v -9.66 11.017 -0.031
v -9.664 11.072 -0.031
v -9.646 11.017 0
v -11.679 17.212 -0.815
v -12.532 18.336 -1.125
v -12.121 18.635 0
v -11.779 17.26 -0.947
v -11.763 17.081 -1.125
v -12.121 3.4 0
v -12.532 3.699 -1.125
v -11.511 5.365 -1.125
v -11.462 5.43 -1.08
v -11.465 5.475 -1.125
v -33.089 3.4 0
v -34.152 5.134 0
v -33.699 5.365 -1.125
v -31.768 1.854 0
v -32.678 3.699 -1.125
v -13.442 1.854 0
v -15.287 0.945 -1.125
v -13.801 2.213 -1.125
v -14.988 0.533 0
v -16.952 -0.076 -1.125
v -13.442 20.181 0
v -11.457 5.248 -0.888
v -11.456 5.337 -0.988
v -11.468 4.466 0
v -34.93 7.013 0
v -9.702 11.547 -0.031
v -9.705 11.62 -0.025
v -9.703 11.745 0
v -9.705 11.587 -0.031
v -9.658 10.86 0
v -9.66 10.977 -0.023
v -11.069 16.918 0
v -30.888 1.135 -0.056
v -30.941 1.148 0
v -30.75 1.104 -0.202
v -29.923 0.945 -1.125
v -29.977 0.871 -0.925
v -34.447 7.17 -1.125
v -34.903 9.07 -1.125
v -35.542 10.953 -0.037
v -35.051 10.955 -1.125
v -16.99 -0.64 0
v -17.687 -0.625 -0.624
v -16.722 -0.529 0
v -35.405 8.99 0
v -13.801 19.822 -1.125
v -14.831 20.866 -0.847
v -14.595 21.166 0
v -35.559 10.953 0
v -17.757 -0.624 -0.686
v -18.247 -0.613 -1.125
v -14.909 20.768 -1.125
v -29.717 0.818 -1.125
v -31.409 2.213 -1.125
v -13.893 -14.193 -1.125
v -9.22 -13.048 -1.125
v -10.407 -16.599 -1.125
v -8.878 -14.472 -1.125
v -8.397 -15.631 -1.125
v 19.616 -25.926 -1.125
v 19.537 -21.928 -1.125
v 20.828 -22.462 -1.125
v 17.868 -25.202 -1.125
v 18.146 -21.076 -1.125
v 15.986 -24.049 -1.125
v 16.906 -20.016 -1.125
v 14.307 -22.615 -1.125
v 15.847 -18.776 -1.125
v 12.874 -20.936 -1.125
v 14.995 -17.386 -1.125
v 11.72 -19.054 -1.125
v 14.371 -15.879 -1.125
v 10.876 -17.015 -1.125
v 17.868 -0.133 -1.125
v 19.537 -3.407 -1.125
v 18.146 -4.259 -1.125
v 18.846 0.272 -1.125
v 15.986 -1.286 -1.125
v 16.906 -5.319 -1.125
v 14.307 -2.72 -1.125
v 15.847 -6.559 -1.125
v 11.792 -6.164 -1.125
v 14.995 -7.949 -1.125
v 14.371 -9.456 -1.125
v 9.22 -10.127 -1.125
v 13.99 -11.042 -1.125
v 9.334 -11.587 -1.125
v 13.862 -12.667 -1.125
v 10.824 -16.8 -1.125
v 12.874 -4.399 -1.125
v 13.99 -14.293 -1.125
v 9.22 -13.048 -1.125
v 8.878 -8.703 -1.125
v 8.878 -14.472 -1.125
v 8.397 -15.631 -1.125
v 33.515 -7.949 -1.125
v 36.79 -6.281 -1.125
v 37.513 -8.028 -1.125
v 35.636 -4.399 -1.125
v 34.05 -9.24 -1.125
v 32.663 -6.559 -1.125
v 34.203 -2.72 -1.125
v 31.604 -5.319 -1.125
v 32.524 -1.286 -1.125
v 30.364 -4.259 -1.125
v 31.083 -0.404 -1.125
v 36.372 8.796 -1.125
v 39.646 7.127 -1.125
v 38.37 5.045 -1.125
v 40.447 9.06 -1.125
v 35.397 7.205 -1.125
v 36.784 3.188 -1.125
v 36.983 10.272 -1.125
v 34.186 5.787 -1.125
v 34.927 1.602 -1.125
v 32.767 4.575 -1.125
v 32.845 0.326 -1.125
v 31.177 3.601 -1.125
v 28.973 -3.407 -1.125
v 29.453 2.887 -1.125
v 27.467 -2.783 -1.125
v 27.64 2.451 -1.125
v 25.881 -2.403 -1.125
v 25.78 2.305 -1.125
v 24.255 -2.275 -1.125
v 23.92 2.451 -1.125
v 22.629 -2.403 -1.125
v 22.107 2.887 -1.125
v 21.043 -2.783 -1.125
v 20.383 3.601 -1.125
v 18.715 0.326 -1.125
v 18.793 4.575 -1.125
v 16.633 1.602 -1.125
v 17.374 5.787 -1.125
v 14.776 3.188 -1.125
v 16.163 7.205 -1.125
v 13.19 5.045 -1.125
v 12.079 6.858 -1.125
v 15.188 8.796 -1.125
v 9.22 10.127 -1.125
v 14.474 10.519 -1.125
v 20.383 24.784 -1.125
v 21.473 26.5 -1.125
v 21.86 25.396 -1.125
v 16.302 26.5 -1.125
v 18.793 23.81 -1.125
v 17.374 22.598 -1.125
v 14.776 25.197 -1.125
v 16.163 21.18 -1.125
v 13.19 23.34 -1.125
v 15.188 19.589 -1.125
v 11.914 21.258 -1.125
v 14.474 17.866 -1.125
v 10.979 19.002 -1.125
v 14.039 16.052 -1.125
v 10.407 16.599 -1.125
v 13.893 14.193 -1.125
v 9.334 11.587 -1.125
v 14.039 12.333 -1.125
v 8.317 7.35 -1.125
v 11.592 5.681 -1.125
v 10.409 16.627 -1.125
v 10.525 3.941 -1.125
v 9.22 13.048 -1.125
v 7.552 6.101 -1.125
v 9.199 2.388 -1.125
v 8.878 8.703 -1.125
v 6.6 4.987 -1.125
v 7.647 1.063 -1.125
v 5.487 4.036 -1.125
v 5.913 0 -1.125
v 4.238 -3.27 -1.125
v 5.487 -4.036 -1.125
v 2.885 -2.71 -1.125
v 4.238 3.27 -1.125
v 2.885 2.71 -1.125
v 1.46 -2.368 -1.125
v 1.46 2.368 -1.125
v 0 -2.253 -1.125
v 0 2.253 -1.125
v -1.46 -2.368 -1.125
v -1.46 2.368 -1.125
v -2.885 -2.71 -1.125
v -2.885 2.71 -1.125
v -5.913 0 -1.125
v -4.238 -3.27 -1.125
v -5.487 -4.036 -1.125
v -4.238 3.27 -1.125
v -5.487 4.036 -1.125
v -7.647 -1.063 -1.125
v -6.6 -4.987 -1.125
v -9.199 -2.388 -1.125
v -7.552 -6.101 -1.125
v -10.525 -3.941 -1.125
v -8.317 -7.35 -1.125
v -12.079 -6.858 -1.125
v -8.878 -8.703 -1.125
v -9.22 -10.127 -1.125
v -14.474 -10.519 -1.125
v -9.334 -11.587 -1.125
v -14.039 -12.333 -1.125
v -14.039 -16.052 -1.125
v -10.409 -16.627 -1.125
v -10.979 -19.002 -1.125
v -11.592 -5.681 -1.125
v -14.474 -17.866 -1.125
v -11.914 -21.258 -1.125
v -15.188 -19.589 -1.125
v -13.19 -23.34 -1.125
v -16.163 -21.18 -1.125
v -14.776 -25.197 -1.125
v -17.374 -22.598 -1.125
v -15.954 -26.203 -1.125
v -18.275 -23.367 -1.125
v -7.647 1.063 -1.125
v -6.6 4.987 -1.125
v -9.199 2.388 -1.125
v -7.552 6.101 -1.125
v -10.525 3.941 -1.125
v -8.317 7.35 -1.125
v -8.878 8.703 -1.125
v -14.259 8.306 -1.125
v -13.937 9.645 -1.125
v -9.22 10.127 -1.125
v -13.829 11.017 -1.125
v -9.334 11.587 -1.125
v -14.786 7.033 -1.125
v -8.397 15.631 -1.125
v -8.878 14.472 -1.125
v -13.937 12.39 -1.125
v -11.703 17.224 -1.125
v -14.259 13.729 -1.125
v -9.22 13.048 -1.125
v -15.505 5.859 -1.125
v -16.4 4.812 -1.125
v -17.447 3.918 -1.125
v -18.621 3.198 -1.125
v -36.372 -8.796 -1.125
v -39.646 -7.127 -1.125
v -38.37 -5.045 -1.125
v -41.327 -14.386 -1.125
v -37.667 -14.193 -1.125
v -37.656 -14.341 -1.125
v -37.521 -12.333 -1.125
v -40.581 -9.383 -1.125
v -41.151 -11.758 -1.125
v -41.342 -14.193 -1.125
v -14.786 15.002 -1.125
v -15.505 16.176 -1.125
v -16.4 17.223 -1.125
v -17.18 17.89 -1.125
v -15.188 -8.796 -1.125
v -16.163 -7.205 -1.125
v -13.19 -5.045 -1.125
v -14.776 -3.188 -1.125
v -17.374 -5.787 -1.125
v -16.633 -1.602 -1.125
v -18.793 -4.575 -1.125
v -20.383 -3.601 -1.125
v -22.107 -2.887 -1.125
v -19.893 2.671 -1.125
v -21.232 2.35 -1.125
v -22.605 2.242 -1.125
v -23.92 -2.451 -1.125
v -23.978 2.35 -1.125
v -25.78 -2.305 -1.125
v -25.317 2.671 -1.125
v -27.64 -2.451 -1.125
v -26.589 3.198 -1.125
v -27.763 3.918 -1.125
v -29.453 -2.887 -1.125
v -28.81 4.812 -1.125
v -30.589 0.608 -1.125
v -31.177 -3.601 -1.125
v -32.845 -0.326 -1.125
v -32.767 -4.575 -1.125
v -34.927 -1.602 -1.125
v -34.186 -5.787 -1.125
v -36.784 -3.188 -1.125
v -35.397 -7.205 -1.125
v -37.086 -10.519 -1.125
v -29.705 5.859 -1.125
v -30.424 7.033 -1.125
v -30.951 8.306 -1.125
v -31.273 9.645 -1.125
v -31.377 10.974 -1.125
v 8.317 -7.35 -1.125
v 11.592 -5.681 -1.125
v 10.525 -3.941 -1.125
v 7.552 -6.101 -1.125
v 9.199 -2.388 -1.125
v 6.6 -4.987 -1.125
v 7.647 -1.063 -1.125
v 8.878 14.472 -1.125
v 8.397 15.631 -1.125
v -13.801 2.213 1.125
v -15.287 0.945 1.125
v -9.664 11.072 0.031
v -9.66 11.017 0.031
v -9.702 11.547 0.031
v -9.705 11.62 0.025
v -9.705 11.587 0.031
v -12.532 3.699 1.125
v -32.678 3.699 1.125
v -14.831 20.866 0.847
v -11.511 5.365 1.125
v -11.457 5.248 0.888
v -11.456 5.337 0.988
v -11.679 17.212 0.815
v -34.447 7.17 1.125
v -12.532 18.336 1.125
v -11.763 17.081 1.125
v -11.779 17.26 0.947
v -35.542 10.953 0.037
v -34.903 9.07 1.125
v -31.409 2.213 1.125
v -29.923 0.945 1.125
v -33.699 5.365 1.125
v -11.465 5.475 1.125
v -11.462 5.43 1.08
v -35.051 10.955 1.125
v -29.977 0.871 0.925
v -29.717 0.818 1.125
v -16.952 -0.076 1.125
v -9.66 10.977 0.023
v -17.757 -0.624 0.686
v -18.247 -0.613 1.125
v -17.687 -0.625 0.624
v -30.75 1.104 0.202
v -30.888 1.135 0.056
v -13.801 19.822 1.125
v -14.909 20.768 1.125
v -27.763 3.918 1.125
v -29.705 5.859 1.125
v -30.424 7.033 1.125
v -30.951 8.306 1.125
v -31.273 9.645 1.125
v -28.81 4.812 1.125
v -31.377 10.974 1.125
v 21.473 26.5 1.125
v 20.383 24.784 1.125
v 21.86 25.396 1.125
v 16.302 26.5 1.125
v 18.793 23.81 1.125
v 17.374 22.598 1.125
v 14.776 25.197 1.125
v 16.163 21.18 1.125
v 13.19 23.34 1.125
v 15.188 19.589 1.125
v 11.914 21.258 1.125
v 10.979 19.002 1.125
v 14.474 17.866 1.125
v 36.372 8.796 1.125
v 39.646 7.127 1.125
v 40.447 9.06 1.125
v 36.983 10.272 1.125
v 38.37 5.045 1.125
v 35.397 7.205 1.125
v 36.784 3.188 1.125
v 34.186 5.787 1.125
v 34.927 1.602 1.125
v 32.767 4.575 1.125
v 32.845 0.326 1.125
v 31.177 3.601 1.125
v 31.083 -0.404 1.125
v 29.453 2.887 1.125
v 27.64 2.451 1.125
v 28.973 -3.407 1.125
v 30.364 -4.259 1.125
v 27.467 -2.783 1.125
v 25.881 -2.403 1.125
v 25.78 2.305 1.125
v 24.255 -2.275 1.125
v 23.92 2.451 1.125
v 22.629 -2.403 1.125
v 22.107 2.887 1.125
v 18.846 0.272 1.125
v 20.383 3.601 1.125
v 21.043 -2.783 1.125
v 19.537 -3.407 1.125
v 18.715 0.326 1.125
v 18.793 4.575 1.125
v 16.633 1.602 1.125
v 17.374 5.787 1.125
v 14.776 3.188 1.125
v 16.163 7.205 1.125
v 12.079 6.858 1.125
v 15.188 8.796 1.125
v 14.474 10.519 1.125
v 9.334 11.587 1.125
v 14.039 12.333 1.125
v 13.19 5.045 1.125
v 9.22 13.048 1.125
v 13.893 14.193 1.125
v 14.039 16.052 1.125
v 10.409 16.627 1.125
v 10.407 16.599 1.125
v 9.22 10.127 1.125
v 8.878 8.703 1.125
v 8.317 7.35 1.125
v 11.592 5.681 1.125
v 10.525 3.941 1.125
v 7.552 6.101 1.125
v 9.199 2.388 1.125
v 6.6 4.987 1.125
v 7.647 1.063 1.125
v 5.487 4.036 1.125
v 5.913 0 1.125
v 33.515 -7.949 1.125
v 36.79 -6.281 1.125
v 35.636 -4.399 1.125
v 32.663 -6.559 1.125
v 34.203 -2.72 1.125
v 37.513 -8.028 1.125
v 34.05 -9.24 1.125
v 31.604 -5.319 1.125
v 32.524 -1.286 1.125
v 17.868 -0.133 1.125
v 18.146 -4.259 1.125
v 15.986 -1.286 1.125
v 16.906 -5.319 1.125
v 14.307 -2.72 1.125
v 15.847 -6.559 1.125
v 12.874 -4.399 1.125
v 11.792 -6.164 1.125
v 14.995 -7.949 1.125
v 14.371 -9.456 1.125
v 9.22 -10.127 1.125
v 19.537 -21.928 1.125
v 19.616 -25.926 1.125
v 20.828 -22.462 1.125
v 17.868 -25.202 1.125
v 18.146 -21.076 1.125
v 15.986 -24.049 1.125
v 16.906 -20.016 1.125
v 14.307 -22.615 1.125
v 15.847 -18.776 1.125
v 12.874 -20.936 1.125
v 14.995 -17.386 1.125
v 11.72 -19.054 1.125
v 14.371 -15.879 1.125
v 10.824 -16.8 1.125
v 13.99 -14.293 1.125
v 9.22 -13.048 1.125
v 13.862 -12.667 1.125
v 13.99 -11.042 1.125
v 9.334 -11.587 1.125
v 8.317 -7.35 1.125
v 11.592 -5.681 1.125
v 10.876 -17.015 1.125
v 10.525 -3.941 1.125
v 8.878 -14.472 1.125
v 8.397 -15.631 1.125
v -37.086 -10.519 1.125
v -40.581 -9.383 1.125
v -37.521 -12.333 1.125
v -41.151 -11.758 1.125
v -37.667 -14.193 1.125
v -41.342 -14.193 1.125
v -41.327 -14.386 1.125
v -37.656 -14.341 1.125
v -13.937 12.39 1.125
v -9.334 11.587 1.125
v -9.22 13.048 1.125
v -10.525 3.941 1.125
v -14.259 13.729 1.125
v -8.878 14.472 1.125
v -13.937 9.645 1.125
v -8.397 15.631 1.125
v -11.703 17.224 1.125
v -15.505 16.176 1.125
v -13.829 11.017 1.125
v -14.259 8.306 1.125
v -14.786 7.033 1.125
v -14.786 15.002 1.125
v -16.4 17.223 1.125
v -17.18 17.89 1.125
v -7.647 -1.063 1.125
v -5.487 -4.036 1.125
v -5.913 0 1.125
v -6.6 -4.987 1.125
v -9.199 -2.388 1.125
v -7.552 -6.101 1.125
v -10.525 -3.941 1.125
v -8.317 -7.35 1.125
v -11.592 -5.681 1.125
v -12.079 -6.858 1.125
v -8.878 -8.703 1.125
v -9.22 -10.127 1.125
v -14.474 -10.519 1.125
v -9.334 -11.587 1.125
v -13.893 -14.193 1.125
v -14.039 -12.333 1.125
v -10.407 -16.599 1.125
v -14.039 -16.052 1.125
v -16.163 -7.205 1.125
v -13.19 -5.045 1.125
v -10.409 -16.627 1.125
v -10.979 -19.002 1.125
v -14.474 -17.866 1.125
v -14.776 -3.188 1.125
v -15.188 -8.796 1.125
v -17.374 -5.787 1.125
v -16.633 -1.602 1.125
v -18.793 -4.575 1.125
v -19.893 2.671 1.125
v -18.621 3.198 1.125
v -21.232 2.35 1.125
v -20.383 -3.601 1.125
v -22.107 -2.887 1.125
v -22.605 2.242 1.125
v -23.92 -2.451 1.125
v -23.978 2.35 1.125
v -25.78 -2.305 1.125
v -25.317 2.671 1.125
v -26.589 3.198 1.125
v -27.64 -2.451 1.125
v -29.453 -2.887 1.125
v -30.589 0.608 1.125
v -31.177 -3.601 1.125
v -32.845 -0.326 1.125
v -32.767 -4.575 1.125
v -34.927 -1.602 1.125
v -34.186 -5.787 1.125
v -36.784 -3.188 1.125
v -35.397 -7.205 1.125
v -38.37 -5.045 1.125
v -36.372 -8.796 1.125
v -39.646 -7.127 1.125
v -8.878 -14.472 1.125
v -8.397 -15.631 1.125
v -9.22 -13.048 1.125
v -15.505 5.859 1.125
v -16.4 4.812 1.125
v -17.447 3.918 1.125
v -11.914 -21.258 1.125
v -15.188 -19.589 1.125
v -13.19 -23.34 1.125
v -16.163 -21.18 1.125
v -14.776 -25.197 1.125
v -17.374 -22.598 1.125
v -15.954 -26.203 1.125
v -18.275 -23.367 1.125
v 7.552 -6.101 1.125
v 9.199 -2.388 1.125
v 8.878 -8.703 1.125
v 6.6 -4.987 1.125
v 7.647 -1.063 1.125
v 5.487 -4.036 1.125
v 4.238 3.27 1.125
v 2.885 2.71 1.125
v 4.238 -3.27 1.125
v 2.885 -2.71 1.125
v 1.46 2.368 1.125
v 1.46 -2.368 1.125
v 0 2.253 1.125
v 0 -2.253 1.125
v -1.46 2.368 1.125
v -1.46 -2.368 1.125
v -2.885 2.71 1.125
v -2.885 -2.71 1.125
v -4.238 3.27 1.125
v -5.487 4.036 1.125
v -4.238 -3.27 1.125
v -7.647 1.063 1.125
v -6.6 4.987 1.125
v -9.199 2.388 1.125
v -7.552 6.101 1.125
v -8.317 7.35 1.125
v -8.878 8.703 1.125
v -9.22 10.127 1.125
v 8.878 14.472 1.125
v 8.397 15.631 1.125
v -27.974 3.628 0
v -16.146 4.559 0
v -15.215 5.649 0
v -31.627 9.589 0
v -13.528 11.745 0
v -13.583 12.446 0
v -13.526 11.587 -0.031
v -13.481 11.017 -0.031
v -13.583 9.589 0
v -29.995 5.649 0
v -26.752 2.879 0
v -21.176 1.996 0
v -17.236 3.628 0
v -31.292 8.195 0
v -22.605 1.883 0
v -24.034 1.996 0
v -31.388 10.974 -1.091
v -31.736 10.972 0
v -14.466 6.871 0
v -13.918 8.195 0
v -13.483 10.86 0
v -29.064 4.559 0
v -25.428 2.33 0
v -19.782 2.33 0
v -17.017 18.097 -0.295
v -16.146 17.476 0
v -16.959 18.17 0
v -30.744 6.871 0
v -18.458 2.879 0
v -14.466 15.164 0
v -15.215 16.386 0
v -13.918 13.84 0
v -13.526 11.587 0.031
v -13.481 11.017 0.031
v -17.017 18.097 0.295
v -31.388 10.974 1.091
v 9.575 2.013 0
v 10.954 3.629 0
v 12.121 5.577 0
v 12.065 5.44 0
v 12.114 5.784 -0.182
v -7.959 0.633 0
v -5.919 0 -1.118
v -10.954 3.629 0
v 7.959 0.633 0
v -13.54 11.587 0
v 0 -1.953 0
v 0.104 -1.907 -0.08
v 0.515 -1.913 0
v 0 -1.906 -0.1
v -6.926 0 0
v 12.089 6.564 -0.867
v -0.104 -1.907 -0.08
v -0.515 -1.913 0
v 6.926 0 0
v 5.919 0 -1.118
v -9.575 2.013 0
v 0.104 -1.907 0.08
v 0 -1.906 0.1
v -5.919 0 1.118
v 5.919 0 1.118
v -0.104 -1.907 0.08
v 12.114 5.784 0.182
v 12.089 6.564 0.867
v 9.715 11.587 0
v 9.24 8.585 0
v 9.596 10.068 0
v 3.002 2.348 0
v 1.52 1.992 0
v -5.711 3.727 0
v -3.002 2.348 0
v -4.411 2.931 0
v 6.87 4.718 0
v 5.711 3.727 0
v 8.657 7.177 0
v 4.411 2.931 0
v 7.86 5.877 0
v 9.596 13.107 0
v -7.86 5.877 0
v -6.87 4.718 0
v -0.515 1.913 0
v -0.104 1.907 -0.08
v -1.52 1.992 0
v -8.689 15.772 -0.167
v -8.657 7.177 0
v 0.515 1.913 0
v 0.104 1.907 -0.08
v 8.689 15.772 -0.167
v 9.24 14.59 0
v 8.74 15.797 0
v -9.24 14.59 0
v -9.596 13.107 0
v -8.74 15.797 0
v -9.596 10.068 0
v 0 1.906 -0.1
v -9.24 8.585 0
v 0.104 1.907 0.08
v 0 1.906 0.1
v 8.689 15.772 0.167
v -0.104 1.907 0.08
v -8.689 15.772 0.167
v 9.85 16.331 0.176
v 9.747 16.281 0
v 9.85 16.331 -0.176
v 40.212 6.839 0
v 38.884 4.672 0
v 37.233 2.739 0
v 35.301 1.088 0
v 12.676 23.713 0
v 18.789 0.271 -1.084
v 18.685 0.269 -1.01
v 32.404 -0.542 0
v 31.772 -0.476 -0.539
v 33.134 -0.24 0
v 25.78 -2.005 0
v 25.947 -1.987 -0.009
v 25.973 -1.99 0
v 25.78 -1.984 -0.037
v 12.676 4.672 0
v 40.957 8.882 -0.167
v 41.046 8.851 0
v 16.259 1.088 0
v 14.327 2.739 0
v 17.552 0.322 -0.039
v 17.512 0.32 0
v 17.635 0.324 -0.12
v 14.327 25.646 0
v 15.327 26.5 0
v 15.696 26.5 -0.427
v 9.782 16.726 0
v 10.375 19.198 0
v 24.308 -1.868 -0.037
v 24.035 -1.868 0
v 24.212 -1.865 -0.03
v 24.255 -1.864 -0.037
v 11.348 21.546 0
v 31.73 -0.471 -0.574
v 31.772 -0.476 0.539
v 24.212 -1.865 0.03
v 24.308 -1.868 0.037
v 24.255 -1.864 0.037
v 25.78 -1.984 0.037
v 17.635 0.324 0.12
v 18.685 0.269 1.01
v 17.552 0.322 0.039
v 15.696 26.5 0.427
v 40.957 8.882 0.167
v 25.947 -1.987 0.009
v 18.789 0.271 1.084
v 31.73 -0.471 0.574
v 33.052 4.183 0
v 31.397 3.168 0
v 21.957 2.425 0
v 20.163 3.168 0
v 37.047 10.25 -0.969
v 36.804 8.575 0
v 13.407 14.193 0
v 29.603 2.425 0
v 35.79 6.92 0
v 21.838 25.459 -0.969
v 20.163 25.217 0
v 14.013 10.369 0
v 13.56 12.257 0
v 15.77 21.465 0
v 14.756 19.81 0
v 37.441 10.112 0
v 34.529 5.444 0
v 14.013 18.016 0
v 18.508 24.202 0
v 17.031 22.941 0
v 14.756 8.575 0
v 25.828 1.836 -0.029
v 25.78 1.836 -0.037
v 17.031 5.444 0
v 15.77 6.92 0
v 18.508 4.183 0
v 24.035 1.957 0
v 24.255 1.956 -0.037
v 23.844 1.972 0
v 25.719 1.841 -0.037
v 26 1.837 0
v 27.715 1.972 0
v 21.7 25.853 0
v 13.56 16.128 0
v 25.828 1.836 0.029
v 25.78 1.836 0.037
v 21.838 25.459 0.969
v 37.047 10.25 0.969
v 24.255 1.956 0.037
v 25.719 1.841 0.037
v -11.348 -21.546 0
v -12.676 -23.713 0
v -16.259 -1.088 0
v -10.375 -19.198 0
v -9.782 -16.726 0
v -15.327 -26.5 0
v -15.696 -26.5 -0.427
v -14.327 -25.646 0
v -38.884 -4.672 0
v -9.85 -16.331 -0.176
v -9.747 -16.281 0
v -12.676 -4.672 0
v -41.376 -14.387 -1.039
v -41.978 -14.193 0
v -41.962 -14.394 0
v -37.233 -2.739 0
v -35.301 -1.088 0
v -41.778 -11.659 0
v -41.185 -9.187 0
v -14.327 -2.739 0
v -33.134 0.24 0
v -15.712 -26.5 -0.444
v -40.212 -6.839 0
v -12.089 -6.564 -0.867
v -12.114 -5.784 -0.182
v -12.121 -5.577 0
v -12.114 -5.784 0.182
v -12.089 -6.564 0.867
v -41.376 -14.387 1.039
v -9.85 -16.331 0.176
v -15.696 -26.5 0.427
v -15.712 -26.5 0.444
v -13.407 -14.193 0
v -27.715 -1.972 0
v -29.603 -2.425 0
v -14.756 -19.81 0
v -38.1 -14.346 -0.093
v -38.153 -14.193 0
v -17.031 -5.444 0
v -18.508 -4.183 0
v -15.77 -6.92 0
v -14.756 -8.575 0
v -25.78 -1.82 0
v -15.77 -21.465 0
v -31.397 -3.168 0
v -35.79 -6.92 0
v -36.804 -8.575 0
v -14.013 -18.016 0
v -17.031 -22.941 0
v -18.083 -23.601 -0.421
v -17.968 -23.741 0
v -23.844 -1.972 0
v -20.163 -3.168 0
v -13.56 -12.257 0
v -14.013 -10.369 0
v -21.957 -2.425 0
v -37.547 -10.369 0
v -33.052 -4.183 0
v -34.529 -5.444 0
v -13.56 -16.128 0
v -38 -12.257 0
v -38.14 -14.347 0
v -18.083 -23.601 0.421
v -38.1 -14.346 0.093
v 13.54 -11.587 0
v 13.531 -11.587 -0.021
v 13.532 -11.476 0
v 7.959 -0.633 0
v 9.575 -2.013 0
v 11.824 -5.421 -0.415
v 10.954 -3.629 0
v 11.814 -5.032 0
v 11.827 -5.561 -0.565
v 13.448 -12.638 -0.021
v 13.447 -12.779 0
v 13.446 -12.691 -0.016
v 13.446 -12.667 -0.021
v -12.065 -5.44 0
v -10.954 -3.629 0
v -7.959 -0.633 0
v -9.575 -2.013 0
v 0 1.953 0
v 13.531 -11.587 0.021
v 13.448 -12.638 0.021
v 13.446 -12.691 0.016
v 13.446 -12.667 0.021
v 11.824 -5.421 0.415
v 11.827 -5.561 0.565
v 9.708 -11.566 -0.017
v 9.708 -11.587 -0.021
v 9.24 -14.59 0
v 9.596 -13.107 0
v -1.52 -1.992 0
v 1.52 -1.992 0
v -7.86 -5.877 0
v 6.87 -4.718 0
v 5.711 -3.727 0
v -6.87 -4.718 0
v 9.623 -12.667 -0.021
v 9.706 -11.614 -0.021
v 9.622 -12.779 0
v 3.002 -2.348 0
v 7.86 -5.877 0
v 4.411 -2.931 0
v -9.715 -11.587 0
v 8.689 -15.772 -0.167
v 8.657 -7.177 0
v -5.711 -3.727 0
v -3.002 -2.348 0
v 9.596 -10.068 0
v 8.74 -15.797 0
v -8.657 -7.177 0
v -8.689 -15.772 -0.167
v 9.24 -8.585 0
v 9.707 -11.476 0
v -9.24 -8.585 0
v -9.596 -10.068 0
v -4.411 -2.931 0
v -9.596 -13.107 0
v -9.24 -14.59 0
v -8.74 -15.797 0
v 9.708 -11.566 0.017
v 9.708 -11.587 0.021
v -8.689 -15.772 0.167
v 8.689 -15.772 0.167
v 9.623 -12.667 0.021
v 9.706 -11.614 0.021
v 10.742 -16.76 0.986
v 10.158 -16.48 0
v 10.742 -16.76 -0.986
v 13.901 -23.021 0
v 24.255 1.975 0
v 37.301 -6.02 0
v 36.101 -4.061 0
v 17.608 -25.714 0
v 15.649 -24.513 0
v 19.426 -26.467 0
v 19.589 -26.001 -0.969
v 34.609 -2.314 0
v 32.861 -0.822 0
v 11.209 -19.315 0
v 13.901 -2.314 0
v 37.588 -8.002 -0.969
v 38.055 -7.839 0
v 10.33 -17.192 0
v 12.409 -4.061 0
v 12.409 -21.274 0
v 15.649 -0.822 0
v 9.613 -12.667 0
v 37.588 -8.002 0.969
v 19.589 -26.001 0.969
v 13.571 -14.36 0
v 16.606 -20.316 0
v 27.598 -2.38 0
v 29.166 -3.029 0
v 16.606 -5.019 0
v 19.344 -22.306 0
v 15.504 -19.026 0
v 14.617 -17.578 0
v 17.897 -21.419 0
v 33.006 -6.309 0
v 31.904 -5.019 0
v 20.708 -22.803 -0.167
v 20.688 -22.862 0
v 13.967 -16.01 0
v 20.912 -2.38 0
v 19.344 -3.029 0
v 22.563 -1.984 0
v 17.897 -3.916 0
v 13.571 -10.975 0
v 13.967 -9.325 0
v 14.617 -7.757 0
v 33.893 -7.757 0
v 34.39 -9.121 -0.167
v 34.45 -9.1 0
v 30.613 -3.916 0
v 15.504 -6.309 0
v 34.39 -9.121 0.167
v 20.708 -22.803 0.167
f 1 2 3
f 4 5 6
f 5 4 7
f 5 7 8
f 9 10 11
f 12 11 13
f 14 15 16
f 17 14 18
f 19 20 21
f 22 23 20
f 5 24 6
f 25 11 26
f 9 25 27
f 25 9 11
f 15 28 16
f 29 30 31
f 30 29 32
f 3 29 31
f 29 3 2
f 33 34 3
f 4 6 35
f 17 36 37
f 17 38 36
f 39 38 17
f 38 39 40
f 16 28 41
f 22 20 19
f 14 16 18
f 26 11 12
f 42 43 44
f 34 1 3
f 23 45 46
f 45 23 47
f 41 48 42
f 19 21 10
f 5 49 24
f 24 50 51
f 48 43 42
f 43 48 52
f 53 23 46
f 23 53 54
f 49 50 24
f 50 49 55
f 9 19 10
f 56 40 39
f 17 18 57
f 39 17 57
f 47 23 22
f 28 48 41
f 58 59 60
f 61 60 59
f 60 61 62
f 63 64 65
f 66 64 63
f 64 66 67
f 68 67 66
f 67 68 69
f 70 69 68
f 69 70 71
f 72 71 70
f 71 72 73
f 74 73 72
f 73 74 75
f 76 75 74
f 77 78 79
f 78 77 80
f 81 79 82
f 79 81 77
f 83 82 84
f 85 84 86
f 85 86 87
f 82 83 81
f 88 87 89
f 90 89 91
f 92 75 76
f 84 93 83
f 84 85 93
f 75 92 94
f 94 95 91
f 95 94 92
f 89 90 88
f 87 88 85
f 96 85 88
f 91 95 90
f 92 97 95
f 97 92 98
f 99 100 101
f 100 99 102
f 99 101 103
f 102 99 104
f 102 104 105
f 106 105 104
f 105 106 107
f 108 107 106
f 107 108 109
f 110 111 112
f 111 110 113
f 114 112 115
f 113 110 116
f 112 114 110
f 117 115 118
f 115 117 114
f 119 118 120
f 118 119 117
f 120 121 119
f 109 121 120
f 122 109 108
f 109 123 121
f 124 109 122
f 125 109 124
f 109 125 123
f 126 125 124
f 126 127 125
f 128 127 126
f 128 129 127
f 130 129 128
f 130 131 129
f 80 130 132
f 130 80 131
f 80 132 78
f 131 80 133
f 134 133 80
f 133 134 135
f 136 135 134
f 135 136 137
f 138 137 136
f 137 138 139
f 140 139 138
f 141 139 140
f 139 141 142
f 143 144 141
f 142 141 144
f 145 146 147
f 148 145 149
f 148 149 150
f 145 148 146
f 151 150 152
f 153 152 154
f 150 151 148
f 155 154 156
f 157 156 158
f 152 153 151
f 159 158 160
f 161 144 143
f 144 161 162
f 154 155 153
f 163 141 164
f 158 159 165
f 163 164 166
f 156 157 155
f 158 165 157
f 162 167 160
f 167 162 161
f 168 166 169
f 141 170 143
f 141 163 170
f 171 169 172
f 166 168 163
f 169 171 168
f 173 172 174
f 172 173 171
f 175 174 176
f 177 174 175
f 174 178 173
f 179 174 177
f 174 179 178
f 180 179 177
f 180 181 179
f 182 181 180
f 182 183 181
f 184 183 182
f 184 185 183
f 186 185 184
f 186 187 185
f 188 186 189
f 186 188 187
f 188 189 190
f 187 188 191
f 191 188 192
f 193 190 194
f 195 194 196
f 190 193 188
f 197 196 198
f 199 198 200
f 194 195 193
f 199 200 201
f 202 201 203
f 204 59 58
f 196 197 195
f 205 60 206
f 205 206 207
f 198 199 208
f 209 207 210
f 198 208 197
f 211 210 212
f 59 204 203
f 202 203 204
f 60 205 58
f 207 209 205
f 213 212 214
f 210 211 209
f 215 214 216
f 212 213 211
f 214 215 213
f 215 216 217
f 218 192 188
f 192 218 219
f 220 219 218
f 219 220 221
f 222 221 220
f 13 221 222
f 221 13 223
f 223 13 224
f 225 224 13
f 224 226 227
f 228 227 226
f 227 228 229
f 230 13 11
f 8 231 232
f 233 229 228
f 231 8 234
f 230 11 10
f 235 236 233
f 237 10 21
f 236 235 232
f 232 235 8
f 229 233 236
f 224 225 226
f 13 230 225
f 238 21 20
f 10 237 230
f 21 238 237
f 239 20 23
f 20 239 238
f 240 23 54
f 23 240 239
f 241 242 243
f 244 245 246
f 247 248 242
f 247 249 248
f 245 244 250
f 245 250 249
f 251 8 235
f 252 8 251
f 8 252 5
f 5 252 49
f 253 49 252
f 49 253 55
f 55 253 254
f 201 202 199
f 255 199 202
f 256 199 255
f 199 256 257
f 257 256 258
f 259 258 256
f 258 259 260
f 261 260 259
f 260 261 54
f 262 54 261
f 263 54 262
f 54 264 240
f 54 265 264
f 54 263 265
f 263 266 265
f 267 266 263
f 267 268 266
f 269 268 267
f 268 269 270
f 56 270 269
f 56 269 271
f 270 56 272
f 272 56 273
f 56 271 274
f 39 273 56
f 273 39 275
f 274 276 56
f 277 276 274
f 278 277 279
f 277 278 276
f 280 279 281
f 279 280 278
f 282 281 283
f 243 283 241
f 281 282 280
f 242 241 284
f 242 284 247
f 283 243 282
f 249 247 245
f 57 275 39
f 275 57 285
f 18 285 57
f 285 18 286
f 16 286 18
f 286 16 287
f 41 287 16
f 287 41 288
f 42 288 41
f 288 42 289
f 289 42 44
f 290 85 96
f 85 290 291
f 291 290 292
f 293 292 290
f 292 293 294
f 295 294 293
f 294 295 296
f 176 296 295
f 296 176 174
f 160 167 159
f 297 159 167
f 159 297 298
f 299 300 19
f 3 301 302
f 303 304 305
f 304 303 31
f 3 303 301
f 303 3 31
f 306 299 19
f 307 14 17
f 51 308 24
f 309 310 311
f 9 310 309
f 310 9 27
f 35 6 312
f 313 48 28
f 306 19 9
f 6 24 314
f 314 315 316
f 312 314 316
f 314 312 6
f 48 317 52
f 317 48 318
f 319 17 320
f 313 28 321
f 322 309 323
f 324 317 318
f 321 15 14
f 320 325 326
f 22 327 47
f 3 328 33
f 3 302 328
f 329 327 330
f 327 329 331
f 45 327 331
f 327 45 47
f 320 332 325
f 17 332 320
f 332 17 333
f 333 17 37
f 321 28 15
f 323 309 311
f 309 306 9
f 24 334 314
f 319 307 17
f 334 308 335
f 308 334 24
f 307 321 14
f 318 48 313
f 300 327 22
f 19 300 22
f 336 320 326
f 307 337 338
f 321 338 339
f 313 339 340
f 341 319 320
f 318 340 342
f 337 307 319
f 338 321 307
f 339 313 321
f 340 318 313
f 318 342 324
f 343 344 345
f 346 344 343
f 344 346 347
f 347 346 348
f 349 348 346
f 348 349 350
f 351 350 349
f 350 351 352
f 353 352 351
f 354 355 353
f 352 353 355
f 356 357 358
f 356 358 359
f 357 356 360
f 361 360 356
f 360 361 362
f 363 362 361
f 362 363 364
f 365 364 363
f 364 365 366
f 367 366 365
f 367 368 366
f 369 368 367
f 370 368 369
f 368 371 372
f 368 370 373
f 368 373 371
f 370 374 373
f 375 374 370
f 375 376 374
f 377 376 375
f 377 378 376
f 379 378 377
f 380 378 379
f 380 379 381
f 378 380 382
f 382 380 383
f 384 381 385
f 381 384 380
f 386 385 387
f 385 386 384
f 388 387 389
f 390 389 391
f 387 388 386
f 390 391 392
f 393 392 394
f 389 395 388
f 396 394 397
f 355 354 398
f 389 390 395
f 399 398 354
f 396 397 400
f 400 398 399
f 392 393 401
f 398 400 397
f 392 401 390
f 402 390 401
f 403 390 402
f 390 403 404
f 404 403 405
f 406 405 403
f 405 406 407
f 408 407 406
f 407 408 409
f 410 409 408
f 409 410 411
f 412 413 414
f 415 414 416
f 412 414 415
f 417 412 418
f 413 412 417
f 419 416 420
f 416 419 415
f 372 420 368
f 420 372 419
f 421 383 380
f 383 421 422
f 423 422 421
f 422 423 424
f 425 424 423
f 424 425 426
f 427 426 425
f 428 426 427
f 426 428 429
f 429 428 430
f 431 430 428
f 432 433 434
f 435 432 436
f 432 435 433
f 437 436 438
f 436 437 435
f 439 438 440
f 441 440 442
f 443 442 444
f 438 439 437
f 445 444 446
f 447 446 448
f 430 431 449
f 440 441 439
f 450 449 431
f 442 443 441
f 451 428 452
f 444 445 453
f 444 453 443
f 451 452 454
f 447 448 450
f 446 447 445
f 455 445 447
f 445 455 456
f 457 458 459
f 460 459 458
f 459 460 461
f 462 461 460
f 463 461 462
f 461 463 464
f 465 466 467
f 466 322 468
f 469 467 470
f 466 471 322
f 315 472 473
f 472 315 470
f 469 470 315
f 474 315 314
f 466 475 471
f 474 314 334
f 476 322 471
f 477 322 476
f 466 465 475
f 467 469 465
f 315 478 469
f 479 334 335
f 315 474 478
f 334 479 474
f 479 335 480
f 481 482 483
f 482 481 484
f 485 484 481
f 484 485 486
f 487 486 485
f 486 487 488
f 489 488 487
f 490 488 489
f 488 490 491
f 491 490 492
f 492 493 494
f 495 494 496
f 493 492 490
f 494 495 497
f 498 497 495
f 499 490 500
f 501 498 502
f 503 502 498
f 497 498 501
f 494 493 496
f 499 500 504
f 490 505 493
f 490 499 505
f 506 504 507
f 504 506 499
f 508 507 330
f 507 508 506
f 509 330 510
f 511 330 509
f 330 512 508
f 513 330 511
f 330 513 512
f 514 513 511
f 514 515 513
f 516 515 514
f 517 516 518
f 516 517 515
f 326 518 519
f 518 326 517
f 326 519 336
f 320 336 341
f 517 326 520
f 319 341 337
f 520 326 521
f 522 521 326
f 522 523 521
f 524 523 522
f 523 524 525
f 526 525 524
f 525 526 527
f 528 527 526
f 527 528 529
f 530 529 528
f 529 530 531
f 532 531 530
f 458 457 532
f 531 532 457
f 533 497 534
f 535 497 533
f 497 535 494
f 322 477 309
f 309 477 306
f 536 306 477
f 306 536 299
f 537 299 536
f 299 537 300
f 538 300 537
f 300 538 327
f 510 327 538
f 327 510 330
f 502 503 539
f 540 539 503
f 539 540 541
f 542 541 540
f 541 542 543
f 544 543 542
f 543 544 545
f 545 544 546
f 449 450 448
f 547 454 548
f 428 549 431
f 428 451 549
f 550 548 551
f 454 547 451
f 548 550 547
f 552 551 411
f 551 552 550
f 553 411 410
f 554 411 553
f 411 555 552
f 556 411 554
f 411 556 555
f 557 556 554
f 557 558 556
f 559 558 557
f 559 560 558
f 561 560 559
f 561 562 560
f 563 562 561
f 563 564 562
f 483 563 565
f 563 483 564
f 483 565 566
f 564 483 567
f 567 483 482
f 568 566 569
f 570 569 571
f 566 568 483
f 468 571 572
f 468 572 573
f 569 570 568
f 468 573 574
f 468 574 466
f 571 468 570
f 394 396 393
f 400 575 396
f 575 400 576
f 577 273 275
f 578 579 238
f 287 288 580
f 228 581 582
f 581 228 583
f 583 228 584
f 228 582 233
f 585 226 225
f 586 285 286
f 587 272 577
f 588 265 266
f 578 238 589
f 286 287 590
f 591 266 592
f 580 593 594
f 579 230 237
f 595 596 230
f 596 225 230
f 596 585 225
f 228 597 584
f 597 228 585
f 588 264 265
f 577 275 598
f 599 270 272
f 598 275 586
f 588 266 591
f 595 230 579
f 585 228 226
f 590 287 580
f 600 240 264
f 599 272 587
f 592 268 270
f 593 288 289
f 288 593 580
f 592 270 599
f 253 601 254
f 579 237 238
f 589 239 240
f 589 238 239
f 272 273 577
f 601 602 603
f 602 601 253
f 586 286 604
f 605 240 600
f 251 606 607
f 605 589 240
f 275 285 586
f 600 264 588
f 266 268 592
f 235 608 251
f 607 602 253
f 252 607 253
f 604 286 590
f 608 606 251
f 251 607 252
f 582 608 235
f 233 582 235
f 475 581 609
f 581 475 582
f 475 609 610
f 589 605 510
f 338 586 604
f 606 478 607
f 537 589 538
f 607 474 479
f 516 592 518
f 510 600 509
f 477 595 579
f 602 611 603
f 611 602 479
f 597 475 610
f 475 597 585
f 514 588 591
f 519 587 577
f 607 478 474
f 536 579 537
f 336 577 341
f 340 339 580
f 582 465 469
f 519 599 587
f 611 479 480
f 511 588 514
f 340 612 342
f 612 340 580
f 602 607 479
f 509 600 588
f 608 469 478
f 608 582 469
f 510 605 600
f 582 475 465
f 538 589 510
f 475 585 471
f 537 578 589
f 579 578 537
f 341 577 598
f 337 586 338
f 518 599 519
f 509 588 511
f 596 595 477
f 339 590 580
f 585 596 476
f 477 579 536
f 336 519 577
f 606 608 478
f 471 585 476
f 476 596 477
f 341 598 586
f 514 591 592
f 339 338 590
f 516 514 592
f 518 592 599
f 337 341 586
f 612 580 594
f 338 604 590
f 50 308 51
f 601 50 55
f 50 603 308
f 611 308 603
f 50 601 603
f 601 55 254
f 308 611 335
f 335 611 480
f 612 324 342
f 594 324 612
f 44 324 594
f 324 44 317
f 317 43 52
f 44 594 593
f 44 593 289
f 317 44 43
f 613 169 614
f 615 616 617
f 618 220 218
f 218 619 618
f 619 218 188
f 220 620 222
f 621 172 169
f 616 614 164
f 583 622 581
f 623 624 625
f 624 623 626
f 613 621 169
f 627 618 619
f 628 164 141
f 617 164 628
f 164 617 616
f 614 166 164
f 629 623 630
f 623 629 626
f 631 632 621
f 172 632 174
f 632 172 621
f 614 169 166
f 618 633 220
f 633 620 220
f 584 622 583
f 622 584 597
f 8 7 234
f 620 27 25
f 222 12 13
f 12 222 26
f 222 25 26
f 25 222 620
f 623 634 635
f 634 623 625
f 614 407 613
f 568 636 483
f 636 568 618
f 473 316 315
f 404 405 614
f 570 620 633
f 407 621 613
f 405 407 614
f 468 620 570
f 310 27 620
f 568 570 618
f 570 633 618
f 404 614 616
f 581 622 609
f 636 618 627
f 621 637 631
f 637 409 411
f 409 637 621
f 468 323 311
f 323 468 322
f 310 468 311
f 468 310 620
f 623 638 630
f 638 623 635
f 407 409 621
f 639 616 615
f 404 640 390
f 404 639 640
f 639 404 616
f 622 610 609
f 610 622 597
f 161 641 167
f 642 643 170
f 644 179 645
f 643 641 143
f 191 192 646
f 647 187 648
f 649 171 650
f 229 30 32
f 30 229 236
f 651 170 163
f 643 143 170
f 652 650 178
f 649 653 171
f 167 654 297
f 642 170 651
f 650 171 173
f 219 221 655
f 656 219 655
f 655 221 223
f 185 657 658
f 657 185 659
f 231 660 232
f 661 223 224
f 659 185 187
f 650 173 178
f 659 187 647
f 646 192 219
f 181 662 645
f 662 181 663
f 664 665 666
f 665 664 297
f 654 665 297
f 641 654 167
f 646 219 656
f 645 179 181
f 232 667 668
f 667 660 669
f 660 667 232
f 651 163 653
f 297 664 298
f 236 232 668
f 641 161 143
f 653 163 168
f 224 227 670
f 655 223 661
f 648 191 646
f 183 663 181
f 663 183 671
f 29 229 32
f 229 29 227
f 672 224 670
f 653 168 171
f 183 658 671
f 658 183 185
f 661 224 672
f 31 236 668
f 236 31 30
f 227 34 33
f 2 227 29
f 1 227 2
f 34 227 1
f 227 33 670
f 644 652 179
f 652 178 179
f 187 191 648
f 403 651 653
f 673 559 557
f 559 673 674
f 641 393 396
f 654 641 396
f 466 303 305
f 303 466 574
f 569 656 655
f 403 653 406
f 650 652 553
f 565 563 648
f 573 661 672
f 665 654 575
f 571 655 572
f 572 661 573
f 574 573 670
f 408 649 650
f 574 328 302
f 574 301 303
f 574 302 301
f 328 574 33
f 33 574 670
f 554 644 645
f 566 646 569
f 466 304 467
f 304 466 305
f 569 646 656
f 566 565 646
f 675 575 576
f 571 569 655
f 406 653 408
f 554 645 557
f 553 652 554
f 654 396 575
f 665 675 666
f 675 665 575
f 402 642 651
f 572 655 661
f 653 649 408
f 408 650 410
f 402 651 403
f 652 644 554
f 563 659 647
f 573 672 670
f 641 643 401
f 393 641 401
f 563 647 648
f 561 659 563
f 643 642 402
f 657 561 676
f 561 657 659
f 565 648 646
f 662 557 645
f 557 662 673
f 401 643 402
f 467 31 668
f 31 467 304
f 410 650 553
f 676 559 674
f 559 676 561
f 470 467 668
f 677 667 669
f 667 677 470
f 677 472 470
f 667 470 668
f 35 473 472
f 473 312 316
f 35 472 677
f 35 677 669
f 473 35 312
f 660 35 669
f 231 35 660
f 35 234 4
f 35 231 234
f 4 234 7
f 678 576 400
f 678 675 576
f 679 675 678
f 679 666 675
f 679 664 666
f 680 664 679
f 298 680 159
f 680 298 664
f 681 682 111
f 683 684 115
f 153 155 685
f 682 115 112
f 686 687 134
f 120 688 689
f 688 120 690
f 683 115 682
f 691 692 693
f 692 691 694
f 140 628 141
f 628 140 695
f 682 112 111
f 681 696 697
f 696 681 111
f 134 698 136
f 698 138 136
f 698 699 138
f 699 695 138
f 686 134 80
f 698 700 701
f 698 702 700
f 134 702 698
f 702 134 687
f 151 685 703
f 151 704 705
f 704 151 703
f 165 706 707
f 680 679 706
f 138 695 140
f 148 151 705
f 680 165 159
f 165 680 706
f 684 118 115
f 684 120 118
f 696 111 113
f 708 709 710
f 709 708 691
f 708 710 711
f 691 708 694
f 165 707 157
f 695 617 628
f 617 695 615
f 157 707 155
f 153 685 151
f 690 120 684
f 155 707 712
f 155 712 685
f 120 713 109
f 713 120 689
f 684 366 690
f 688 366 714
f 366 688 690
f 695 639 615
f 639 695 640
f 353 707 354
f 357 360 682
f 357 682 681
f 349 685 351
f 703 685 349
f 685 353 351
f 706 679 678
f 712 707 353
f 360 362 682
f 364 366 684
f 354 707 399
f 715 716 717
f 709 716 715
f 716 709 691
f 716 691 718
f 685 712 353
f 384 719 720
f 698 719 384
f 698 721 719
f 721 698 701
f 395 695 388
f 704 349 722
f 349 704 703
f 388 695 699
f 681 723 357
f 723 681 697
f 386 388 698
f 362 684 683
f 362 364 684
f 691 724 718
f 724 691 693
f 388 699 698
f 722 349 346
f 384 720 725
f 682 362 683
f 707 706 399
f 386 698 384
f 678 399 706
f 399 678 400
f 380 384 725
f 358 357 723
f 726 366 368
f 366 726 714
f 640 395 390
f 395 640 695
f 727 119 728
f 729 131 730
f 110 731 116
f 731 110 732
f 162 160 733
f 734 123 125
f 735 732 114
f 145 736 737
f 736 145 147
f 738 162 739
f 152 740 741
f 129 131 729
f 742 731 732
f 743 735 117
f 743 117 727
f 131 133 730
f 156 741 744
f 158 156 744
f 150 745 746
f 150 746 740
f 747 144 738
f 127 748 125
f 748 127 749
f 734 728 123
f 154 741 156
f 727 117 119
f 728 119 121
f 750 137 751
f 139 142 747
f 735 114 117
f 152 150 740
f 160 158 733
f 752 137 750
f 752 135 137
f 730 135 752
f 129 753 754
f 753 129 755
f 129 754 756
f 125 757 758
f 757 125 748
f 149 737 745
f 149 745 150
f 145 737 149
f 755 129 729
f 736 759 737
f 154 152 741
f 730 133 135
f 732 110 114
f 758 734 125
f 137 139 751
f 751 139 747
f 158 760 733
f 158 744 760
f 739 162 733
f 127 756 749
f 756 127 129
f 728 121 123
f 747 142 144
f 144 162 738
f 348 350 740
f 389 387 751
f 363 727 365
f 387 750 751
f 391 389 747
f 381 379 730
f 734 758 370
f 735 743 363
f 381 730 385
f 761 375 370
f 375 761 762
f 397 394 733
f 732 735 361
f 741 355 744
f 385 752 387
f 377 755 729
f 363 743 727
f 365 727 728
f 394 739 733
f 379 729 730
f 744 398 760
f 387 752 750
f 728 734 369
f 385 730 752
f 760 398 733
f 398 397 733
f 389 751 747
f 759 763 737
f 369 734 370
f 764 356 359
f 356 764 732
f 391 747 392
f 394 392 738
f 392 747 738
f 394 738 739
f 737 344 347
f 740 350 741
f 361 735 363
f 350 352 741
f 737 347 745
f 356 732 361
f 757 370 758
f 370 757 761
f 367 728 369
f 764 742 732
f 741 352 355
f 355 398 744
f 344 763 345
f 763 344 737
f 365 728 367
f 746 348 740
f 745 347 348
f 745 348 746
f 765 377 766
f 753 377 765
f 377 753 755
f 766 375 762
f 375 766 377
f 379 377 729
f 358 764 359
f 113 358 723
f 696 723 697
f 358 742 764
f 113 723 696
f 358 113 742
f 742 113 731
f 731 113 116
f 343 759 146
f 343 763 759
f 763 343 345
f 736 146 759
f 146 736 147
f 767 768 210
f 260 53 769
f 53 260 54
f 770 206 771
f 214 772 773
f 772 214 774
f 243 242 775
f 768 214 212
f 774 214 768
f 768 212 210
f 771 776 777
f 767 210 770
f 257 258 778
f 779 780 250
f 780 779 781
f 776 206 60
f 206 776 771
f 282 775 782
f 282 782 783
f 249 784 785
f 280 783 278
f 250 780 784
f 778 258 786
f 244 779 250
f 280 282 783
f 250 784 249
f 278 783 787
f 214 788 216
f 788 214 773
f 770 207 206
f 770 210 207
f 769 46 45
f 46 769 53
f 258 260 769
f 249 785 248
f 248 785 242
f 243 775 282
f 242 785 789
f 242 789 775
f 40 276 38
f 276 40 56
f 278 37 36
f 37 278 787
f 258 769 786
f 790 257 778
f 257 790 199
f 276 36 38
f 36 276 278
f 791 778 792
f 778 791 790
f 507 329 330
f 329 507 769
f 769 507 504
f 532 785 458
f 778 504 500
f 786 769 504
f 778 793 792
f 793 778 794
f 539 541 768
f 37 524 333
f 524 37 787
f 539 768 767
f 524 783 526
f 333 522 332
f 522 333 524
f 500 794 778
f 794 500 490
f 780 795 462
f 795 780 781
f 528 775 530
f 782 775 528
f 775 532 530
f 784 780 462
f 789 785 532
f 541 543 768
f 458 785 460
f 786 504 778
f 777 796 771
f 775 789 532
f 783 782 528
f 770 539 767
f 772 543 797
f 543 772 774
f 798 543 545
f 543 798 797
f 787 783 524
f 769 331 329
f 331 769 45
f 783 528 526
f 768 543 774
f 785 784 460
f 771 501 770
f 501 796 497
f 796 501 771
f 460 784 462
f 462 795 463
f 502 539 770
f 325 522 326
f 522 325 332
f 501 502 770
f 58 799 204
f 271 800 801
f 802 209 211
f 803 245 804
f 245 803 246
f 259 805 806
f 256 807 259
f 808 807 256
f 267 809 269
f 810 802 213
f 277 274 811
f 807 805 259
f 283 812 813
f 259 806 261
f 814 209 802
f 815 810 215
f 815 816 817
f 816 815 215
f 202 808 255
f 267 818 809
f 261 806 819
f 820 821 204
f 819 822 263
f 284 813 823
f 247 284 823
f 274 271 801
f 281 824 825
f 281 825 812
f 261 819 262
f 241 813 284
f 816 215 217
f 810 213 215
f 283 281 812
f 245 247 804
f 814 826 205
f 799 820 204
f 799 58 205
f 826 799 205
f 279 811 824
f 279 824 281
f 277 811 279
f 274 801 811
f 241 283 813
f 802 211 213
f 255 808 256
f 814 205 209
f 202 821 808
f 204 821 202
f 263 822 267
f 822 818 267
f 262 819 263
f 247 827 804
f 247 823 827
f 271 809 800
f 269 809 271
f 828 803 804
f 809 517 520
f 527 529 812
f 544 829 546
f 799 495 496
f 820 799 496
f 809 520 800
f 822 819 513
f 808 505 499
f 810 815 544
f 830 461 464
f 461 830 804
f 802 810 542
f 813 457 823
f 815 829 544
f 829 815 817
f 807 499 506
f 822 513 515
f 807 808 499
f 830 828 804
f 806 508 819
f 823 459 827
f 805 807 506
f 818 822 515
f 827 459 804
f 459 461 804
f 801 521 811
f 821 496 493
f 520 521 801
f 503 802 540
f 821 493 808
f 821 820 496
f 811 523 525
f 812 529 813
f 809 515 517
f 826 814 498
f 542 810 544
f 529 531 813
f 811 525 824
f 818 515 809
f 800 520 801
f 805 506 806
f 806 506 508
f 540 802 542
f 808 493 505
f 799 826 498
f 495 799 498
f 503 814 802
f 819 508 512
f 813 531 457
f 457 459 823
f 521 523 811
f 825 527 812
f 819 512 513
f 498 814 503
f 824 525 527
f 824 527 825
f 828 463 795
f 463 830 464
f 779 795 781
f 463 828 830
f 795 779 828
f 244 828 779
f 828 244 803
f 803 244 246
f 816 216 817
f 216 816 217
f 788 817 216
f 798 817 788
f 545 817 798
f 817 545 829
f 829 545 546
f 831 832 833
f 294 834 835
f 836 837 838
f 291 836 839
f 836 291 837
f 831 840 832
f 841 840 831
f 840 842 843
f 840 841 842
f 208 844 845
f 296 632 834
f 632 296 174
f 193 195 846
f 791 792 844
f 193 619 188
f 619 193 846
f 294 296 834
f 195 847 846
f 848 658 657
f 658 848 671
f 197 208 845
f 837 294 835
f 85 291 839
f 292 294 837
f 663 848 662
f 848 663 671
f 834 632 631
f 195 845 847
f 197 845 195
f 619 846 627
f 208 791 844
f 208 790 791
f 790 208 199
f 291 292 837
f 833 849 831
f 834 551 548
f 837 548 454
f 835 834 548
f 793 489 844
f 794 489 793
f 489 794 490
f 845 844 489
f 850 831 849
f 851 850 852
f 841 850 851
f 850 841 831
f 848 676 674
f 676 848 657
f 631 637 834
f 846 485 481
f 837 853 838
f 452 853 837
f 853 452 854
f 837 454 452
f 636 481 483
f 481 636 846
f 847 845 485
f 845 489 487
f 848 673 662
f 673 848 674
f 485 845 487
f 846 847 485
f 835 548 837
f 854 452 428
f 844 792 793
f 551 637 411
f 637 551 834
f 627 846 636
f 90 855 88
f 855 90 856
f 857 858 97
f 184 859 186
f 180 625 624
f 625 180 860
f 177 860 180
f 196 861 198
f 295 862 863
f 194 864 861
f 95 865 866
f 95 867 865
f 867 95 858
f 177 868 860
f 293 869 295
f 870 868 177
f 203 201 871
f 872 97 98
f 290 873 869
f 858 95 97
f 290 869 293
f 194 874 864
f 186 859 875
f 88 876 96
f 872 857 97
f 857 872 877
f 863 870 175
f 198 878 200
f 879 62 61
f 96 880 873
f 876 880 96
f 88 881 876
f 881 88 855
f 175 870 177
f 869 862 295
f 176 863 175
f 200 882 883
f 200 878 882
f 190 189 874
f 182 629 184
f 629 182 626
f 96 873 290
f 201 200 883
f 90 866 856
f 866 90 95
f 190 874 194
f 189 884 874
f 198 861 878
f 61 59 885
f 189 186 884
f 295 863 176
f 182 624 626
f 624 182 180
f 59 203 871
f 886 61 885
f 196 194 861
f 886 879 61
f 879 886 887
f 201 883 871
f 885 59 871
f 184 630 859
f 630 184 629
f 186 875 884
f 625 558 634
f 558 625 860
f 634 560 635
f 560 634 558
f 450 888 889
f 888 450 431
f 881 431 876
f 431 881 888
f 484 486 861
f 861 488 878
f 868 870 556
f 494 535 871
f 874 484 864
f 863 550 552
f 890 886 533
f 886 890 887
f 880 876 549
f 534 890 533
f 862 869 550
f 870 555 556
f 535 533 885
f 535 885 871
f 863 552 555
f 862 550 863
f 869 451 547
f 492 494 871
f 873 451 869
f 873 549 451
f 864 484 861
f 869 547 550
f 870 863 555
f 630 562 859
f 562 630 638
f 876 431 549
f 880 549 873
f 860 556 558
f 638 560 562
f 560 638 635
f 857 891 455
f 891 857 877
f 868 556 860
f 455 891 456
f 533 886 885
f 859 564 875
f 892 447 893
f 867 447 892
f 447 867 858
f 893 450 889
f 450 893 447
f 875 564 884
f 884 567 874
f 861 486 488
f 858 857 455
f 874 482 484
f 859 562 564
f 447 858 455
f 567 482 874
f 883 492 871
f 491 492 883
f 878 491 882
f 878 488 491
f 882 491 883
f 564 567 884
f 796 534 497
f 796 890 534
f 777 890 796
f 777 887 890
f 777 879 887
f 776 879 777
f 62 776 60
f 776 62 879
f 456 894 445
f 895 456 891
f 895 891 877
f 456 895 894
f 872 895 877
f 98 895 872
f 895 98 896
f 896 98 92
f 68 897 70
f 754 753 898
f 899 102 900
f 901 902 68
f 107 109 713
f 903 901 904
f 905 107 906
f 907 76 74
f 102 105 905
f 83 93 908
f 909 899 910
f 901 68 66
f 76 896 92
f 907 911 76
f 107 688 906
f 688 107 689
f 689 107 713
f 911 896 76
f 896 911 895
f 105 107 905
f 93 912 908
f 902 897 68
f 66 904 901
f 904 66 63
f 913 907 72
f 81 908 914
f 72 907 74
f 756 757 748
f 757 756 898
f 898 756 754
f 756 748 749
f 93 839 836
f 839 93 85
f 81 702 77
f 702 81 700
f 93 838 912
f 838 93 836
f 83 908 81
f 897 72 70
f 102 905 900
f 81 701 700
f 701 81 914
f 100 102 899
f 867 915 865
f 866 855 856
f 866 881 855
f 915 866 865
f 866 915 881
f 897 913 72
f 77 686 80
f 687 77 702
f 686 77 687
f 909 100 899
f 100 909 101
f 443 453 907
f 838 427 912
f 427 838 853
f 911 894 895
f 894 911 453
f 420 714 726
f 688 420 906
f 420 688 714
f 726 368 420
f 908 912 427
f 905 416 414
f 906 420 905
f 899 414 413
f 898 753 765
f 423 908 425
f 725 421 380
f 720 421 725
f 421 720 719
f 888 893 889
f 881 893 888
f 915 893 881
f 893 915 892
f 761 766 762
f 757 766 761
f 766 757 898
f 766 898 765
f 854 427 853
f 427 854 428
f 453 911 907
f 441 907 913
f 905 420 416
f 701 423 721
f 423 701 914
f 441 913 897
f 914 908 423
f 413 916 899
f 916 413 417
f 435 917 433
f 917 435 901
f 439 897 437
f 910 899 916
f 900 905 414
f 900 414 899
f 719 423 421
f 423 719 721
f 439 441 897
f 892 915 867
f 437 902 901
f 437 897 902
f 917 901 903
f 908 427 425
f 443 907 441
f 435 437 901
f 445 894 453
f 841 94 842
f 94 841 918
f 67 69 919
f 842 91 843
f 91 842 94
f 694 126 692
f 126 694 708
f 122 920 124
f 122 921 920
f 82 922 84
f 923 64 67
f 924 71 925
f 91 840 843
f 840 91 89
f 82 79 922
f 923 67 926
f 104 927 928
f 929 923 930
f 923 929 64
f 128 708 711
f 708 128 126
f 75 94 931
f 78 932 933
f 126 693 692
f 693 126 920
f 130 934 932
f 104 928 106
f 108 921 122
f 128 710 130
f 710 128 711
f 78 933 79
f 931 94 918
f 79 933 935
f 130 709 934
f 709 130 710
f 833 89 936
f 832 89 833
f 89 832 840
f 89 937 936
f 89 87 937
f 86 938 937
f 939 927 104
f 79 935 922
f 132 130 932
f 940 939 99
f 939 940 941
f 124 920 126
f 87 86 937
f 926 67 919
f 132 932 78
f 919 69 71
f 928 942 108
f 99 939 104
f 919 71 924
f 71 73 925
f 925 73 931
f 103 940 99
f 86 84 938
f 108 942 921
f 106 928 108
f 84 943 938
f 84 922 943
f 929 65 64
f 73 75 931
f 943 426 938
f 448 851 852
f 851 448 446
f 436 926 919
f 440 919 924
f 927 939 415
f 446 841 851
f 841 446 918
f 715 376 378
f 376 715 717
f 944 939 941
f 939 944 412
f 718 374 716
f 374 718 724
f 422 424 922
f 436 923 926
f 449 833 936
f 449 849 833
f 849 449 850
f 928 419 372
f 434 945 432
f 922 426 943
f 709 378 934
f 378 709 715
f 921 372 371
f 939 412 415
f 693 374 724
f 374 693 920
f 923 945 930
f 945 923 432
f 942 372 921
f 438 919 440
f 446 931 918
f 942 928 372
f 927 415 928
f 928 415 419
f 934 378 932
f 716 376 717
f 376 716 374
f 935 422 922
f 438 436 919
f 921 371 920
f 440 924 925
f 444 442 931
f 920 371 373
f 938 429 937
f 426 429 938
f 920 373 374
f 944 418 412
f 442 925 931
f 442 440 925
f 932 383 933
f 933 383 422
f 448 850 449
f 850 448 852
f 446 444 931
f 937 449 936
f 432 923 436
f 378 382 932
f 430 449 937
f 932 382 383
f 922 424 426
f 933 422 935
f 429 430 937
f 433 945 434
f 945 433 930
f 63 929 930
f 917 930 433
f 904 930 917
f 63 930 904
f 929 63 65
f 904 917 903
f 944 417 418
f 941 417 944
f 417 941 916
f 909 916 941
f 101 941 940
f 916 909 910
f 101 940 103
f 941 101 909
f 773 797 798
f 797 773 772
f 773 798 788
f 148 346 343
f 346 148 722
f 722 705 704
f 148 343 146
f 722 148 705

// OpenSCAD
//coin diameter (mm)
coin1=17.91;
//coin diameter (mm)
coin2=19.05;
//coin diameter (mm)
coin3=24.26;
//coin diameter (mm)
coin4=24.26;
//coin diameter (mm)
coin5=19.05;
//coin diameter (mm)
coin6=21.21;
//Thickness (thicker than thickest coin) (mm)
Thickness=2.25;
//Hub width (separation) (mm)
WallWidth=3.75;

/* [Hidden] */
Length=85; //Credit Card Size
Width=53; //Credit Card Size
//NDia=21.21; //US Nickle Diameter
//NThick=1.95; //US Nickle Thickness
//DDia=17.91; //US Dime Diameter
//DThick=1.35; //US Dime Thickness
//QDia=24.26; //US Quarter Diameter
//QThick=1.75; //US Quarter Thickness
//PDia=19.05; //US Penny Diameter
//PThick=1.52; //US Penny Thickness
$fn=40;

module CoinHole(Diameter){
translate([0,0,-Thickness/2])cylinder(r1=Diameter*0.49,r2=Diameter*.51,h=Thickness/2);
translate([0,0,0])cylinder(r1=Diameter*0.51,r2=Diameter*.49,h=Thickness/2);
cylinder(r=Diameter*.49,h=Thickness*2,center=true);
}
module OutCoinHole(Diameter){
translate([0,0,-Thickness/2])cylinder(r1=Diameter*0.49,r2=Diameter*.51,h=Thickness/2);
translate([0,0,0])cylinder(r1=Diameter*0.51,r2=Diameter*.49,h=Thickness/2);
//cylinder(r=Diameter*.49,h=Thickness*2,center=true);
}
module CutOut(Size){
translate([-Size,0,-Thickness])cylinder(r=Size,h=Thickness*2,$fn=7,center=false);
}
module CoinCircle(XLoc,YLoc,Diameter,Rot){
difference(){
translate([XLoc,YLoc,0])OutCoinHole(Diameter+WallWidth*2); //Outside Circle
translate([XLoc,YLoc,0])CoinHole(Diameter); //Inside Circle
translate([XLoc,YLoc,0])rotate(a=[0,0,Rot])CutOut(Diameter); //Stress Notch
}
}
Separation=WallWidth * 1.1;
intersection(){
union(){
		CoinCircle(-((coin1/2)+(coin2/2)+Separation),(coin1/2)+(Separation/2),coin1,-64); //coin 1, upper left
		CoinCircle(0,(coin2/2)+(Separation/2),coin2,-90); //coin 2, upper middle
		CoinCircle(((coin2/2)+(coin3/2)+Separation),(coin3/2)+(Separation/2),coin3,-135); //coin 3, upper right
		CoinCircle(-((coin4/2)+(coin5/2)+Separation),-((coin4/2)+(Separation/2)),coin4,65); //coin 4, lower left
		CoinCircle(0,-((coin5/2)+(Separation/2)),coin5,90); //coin 5, lower middle
		CoinCircle(((coin5/2)+(coin6/2)+Separation),-((coin6/2)+(Separation/2)),coin6,135); //coin 6, lower right
}
minkowski(){
cube([Length-4,Width-4,Thickness],center=true);
cylinder(r=2,h=Thickness/2,center=true);
}
}
